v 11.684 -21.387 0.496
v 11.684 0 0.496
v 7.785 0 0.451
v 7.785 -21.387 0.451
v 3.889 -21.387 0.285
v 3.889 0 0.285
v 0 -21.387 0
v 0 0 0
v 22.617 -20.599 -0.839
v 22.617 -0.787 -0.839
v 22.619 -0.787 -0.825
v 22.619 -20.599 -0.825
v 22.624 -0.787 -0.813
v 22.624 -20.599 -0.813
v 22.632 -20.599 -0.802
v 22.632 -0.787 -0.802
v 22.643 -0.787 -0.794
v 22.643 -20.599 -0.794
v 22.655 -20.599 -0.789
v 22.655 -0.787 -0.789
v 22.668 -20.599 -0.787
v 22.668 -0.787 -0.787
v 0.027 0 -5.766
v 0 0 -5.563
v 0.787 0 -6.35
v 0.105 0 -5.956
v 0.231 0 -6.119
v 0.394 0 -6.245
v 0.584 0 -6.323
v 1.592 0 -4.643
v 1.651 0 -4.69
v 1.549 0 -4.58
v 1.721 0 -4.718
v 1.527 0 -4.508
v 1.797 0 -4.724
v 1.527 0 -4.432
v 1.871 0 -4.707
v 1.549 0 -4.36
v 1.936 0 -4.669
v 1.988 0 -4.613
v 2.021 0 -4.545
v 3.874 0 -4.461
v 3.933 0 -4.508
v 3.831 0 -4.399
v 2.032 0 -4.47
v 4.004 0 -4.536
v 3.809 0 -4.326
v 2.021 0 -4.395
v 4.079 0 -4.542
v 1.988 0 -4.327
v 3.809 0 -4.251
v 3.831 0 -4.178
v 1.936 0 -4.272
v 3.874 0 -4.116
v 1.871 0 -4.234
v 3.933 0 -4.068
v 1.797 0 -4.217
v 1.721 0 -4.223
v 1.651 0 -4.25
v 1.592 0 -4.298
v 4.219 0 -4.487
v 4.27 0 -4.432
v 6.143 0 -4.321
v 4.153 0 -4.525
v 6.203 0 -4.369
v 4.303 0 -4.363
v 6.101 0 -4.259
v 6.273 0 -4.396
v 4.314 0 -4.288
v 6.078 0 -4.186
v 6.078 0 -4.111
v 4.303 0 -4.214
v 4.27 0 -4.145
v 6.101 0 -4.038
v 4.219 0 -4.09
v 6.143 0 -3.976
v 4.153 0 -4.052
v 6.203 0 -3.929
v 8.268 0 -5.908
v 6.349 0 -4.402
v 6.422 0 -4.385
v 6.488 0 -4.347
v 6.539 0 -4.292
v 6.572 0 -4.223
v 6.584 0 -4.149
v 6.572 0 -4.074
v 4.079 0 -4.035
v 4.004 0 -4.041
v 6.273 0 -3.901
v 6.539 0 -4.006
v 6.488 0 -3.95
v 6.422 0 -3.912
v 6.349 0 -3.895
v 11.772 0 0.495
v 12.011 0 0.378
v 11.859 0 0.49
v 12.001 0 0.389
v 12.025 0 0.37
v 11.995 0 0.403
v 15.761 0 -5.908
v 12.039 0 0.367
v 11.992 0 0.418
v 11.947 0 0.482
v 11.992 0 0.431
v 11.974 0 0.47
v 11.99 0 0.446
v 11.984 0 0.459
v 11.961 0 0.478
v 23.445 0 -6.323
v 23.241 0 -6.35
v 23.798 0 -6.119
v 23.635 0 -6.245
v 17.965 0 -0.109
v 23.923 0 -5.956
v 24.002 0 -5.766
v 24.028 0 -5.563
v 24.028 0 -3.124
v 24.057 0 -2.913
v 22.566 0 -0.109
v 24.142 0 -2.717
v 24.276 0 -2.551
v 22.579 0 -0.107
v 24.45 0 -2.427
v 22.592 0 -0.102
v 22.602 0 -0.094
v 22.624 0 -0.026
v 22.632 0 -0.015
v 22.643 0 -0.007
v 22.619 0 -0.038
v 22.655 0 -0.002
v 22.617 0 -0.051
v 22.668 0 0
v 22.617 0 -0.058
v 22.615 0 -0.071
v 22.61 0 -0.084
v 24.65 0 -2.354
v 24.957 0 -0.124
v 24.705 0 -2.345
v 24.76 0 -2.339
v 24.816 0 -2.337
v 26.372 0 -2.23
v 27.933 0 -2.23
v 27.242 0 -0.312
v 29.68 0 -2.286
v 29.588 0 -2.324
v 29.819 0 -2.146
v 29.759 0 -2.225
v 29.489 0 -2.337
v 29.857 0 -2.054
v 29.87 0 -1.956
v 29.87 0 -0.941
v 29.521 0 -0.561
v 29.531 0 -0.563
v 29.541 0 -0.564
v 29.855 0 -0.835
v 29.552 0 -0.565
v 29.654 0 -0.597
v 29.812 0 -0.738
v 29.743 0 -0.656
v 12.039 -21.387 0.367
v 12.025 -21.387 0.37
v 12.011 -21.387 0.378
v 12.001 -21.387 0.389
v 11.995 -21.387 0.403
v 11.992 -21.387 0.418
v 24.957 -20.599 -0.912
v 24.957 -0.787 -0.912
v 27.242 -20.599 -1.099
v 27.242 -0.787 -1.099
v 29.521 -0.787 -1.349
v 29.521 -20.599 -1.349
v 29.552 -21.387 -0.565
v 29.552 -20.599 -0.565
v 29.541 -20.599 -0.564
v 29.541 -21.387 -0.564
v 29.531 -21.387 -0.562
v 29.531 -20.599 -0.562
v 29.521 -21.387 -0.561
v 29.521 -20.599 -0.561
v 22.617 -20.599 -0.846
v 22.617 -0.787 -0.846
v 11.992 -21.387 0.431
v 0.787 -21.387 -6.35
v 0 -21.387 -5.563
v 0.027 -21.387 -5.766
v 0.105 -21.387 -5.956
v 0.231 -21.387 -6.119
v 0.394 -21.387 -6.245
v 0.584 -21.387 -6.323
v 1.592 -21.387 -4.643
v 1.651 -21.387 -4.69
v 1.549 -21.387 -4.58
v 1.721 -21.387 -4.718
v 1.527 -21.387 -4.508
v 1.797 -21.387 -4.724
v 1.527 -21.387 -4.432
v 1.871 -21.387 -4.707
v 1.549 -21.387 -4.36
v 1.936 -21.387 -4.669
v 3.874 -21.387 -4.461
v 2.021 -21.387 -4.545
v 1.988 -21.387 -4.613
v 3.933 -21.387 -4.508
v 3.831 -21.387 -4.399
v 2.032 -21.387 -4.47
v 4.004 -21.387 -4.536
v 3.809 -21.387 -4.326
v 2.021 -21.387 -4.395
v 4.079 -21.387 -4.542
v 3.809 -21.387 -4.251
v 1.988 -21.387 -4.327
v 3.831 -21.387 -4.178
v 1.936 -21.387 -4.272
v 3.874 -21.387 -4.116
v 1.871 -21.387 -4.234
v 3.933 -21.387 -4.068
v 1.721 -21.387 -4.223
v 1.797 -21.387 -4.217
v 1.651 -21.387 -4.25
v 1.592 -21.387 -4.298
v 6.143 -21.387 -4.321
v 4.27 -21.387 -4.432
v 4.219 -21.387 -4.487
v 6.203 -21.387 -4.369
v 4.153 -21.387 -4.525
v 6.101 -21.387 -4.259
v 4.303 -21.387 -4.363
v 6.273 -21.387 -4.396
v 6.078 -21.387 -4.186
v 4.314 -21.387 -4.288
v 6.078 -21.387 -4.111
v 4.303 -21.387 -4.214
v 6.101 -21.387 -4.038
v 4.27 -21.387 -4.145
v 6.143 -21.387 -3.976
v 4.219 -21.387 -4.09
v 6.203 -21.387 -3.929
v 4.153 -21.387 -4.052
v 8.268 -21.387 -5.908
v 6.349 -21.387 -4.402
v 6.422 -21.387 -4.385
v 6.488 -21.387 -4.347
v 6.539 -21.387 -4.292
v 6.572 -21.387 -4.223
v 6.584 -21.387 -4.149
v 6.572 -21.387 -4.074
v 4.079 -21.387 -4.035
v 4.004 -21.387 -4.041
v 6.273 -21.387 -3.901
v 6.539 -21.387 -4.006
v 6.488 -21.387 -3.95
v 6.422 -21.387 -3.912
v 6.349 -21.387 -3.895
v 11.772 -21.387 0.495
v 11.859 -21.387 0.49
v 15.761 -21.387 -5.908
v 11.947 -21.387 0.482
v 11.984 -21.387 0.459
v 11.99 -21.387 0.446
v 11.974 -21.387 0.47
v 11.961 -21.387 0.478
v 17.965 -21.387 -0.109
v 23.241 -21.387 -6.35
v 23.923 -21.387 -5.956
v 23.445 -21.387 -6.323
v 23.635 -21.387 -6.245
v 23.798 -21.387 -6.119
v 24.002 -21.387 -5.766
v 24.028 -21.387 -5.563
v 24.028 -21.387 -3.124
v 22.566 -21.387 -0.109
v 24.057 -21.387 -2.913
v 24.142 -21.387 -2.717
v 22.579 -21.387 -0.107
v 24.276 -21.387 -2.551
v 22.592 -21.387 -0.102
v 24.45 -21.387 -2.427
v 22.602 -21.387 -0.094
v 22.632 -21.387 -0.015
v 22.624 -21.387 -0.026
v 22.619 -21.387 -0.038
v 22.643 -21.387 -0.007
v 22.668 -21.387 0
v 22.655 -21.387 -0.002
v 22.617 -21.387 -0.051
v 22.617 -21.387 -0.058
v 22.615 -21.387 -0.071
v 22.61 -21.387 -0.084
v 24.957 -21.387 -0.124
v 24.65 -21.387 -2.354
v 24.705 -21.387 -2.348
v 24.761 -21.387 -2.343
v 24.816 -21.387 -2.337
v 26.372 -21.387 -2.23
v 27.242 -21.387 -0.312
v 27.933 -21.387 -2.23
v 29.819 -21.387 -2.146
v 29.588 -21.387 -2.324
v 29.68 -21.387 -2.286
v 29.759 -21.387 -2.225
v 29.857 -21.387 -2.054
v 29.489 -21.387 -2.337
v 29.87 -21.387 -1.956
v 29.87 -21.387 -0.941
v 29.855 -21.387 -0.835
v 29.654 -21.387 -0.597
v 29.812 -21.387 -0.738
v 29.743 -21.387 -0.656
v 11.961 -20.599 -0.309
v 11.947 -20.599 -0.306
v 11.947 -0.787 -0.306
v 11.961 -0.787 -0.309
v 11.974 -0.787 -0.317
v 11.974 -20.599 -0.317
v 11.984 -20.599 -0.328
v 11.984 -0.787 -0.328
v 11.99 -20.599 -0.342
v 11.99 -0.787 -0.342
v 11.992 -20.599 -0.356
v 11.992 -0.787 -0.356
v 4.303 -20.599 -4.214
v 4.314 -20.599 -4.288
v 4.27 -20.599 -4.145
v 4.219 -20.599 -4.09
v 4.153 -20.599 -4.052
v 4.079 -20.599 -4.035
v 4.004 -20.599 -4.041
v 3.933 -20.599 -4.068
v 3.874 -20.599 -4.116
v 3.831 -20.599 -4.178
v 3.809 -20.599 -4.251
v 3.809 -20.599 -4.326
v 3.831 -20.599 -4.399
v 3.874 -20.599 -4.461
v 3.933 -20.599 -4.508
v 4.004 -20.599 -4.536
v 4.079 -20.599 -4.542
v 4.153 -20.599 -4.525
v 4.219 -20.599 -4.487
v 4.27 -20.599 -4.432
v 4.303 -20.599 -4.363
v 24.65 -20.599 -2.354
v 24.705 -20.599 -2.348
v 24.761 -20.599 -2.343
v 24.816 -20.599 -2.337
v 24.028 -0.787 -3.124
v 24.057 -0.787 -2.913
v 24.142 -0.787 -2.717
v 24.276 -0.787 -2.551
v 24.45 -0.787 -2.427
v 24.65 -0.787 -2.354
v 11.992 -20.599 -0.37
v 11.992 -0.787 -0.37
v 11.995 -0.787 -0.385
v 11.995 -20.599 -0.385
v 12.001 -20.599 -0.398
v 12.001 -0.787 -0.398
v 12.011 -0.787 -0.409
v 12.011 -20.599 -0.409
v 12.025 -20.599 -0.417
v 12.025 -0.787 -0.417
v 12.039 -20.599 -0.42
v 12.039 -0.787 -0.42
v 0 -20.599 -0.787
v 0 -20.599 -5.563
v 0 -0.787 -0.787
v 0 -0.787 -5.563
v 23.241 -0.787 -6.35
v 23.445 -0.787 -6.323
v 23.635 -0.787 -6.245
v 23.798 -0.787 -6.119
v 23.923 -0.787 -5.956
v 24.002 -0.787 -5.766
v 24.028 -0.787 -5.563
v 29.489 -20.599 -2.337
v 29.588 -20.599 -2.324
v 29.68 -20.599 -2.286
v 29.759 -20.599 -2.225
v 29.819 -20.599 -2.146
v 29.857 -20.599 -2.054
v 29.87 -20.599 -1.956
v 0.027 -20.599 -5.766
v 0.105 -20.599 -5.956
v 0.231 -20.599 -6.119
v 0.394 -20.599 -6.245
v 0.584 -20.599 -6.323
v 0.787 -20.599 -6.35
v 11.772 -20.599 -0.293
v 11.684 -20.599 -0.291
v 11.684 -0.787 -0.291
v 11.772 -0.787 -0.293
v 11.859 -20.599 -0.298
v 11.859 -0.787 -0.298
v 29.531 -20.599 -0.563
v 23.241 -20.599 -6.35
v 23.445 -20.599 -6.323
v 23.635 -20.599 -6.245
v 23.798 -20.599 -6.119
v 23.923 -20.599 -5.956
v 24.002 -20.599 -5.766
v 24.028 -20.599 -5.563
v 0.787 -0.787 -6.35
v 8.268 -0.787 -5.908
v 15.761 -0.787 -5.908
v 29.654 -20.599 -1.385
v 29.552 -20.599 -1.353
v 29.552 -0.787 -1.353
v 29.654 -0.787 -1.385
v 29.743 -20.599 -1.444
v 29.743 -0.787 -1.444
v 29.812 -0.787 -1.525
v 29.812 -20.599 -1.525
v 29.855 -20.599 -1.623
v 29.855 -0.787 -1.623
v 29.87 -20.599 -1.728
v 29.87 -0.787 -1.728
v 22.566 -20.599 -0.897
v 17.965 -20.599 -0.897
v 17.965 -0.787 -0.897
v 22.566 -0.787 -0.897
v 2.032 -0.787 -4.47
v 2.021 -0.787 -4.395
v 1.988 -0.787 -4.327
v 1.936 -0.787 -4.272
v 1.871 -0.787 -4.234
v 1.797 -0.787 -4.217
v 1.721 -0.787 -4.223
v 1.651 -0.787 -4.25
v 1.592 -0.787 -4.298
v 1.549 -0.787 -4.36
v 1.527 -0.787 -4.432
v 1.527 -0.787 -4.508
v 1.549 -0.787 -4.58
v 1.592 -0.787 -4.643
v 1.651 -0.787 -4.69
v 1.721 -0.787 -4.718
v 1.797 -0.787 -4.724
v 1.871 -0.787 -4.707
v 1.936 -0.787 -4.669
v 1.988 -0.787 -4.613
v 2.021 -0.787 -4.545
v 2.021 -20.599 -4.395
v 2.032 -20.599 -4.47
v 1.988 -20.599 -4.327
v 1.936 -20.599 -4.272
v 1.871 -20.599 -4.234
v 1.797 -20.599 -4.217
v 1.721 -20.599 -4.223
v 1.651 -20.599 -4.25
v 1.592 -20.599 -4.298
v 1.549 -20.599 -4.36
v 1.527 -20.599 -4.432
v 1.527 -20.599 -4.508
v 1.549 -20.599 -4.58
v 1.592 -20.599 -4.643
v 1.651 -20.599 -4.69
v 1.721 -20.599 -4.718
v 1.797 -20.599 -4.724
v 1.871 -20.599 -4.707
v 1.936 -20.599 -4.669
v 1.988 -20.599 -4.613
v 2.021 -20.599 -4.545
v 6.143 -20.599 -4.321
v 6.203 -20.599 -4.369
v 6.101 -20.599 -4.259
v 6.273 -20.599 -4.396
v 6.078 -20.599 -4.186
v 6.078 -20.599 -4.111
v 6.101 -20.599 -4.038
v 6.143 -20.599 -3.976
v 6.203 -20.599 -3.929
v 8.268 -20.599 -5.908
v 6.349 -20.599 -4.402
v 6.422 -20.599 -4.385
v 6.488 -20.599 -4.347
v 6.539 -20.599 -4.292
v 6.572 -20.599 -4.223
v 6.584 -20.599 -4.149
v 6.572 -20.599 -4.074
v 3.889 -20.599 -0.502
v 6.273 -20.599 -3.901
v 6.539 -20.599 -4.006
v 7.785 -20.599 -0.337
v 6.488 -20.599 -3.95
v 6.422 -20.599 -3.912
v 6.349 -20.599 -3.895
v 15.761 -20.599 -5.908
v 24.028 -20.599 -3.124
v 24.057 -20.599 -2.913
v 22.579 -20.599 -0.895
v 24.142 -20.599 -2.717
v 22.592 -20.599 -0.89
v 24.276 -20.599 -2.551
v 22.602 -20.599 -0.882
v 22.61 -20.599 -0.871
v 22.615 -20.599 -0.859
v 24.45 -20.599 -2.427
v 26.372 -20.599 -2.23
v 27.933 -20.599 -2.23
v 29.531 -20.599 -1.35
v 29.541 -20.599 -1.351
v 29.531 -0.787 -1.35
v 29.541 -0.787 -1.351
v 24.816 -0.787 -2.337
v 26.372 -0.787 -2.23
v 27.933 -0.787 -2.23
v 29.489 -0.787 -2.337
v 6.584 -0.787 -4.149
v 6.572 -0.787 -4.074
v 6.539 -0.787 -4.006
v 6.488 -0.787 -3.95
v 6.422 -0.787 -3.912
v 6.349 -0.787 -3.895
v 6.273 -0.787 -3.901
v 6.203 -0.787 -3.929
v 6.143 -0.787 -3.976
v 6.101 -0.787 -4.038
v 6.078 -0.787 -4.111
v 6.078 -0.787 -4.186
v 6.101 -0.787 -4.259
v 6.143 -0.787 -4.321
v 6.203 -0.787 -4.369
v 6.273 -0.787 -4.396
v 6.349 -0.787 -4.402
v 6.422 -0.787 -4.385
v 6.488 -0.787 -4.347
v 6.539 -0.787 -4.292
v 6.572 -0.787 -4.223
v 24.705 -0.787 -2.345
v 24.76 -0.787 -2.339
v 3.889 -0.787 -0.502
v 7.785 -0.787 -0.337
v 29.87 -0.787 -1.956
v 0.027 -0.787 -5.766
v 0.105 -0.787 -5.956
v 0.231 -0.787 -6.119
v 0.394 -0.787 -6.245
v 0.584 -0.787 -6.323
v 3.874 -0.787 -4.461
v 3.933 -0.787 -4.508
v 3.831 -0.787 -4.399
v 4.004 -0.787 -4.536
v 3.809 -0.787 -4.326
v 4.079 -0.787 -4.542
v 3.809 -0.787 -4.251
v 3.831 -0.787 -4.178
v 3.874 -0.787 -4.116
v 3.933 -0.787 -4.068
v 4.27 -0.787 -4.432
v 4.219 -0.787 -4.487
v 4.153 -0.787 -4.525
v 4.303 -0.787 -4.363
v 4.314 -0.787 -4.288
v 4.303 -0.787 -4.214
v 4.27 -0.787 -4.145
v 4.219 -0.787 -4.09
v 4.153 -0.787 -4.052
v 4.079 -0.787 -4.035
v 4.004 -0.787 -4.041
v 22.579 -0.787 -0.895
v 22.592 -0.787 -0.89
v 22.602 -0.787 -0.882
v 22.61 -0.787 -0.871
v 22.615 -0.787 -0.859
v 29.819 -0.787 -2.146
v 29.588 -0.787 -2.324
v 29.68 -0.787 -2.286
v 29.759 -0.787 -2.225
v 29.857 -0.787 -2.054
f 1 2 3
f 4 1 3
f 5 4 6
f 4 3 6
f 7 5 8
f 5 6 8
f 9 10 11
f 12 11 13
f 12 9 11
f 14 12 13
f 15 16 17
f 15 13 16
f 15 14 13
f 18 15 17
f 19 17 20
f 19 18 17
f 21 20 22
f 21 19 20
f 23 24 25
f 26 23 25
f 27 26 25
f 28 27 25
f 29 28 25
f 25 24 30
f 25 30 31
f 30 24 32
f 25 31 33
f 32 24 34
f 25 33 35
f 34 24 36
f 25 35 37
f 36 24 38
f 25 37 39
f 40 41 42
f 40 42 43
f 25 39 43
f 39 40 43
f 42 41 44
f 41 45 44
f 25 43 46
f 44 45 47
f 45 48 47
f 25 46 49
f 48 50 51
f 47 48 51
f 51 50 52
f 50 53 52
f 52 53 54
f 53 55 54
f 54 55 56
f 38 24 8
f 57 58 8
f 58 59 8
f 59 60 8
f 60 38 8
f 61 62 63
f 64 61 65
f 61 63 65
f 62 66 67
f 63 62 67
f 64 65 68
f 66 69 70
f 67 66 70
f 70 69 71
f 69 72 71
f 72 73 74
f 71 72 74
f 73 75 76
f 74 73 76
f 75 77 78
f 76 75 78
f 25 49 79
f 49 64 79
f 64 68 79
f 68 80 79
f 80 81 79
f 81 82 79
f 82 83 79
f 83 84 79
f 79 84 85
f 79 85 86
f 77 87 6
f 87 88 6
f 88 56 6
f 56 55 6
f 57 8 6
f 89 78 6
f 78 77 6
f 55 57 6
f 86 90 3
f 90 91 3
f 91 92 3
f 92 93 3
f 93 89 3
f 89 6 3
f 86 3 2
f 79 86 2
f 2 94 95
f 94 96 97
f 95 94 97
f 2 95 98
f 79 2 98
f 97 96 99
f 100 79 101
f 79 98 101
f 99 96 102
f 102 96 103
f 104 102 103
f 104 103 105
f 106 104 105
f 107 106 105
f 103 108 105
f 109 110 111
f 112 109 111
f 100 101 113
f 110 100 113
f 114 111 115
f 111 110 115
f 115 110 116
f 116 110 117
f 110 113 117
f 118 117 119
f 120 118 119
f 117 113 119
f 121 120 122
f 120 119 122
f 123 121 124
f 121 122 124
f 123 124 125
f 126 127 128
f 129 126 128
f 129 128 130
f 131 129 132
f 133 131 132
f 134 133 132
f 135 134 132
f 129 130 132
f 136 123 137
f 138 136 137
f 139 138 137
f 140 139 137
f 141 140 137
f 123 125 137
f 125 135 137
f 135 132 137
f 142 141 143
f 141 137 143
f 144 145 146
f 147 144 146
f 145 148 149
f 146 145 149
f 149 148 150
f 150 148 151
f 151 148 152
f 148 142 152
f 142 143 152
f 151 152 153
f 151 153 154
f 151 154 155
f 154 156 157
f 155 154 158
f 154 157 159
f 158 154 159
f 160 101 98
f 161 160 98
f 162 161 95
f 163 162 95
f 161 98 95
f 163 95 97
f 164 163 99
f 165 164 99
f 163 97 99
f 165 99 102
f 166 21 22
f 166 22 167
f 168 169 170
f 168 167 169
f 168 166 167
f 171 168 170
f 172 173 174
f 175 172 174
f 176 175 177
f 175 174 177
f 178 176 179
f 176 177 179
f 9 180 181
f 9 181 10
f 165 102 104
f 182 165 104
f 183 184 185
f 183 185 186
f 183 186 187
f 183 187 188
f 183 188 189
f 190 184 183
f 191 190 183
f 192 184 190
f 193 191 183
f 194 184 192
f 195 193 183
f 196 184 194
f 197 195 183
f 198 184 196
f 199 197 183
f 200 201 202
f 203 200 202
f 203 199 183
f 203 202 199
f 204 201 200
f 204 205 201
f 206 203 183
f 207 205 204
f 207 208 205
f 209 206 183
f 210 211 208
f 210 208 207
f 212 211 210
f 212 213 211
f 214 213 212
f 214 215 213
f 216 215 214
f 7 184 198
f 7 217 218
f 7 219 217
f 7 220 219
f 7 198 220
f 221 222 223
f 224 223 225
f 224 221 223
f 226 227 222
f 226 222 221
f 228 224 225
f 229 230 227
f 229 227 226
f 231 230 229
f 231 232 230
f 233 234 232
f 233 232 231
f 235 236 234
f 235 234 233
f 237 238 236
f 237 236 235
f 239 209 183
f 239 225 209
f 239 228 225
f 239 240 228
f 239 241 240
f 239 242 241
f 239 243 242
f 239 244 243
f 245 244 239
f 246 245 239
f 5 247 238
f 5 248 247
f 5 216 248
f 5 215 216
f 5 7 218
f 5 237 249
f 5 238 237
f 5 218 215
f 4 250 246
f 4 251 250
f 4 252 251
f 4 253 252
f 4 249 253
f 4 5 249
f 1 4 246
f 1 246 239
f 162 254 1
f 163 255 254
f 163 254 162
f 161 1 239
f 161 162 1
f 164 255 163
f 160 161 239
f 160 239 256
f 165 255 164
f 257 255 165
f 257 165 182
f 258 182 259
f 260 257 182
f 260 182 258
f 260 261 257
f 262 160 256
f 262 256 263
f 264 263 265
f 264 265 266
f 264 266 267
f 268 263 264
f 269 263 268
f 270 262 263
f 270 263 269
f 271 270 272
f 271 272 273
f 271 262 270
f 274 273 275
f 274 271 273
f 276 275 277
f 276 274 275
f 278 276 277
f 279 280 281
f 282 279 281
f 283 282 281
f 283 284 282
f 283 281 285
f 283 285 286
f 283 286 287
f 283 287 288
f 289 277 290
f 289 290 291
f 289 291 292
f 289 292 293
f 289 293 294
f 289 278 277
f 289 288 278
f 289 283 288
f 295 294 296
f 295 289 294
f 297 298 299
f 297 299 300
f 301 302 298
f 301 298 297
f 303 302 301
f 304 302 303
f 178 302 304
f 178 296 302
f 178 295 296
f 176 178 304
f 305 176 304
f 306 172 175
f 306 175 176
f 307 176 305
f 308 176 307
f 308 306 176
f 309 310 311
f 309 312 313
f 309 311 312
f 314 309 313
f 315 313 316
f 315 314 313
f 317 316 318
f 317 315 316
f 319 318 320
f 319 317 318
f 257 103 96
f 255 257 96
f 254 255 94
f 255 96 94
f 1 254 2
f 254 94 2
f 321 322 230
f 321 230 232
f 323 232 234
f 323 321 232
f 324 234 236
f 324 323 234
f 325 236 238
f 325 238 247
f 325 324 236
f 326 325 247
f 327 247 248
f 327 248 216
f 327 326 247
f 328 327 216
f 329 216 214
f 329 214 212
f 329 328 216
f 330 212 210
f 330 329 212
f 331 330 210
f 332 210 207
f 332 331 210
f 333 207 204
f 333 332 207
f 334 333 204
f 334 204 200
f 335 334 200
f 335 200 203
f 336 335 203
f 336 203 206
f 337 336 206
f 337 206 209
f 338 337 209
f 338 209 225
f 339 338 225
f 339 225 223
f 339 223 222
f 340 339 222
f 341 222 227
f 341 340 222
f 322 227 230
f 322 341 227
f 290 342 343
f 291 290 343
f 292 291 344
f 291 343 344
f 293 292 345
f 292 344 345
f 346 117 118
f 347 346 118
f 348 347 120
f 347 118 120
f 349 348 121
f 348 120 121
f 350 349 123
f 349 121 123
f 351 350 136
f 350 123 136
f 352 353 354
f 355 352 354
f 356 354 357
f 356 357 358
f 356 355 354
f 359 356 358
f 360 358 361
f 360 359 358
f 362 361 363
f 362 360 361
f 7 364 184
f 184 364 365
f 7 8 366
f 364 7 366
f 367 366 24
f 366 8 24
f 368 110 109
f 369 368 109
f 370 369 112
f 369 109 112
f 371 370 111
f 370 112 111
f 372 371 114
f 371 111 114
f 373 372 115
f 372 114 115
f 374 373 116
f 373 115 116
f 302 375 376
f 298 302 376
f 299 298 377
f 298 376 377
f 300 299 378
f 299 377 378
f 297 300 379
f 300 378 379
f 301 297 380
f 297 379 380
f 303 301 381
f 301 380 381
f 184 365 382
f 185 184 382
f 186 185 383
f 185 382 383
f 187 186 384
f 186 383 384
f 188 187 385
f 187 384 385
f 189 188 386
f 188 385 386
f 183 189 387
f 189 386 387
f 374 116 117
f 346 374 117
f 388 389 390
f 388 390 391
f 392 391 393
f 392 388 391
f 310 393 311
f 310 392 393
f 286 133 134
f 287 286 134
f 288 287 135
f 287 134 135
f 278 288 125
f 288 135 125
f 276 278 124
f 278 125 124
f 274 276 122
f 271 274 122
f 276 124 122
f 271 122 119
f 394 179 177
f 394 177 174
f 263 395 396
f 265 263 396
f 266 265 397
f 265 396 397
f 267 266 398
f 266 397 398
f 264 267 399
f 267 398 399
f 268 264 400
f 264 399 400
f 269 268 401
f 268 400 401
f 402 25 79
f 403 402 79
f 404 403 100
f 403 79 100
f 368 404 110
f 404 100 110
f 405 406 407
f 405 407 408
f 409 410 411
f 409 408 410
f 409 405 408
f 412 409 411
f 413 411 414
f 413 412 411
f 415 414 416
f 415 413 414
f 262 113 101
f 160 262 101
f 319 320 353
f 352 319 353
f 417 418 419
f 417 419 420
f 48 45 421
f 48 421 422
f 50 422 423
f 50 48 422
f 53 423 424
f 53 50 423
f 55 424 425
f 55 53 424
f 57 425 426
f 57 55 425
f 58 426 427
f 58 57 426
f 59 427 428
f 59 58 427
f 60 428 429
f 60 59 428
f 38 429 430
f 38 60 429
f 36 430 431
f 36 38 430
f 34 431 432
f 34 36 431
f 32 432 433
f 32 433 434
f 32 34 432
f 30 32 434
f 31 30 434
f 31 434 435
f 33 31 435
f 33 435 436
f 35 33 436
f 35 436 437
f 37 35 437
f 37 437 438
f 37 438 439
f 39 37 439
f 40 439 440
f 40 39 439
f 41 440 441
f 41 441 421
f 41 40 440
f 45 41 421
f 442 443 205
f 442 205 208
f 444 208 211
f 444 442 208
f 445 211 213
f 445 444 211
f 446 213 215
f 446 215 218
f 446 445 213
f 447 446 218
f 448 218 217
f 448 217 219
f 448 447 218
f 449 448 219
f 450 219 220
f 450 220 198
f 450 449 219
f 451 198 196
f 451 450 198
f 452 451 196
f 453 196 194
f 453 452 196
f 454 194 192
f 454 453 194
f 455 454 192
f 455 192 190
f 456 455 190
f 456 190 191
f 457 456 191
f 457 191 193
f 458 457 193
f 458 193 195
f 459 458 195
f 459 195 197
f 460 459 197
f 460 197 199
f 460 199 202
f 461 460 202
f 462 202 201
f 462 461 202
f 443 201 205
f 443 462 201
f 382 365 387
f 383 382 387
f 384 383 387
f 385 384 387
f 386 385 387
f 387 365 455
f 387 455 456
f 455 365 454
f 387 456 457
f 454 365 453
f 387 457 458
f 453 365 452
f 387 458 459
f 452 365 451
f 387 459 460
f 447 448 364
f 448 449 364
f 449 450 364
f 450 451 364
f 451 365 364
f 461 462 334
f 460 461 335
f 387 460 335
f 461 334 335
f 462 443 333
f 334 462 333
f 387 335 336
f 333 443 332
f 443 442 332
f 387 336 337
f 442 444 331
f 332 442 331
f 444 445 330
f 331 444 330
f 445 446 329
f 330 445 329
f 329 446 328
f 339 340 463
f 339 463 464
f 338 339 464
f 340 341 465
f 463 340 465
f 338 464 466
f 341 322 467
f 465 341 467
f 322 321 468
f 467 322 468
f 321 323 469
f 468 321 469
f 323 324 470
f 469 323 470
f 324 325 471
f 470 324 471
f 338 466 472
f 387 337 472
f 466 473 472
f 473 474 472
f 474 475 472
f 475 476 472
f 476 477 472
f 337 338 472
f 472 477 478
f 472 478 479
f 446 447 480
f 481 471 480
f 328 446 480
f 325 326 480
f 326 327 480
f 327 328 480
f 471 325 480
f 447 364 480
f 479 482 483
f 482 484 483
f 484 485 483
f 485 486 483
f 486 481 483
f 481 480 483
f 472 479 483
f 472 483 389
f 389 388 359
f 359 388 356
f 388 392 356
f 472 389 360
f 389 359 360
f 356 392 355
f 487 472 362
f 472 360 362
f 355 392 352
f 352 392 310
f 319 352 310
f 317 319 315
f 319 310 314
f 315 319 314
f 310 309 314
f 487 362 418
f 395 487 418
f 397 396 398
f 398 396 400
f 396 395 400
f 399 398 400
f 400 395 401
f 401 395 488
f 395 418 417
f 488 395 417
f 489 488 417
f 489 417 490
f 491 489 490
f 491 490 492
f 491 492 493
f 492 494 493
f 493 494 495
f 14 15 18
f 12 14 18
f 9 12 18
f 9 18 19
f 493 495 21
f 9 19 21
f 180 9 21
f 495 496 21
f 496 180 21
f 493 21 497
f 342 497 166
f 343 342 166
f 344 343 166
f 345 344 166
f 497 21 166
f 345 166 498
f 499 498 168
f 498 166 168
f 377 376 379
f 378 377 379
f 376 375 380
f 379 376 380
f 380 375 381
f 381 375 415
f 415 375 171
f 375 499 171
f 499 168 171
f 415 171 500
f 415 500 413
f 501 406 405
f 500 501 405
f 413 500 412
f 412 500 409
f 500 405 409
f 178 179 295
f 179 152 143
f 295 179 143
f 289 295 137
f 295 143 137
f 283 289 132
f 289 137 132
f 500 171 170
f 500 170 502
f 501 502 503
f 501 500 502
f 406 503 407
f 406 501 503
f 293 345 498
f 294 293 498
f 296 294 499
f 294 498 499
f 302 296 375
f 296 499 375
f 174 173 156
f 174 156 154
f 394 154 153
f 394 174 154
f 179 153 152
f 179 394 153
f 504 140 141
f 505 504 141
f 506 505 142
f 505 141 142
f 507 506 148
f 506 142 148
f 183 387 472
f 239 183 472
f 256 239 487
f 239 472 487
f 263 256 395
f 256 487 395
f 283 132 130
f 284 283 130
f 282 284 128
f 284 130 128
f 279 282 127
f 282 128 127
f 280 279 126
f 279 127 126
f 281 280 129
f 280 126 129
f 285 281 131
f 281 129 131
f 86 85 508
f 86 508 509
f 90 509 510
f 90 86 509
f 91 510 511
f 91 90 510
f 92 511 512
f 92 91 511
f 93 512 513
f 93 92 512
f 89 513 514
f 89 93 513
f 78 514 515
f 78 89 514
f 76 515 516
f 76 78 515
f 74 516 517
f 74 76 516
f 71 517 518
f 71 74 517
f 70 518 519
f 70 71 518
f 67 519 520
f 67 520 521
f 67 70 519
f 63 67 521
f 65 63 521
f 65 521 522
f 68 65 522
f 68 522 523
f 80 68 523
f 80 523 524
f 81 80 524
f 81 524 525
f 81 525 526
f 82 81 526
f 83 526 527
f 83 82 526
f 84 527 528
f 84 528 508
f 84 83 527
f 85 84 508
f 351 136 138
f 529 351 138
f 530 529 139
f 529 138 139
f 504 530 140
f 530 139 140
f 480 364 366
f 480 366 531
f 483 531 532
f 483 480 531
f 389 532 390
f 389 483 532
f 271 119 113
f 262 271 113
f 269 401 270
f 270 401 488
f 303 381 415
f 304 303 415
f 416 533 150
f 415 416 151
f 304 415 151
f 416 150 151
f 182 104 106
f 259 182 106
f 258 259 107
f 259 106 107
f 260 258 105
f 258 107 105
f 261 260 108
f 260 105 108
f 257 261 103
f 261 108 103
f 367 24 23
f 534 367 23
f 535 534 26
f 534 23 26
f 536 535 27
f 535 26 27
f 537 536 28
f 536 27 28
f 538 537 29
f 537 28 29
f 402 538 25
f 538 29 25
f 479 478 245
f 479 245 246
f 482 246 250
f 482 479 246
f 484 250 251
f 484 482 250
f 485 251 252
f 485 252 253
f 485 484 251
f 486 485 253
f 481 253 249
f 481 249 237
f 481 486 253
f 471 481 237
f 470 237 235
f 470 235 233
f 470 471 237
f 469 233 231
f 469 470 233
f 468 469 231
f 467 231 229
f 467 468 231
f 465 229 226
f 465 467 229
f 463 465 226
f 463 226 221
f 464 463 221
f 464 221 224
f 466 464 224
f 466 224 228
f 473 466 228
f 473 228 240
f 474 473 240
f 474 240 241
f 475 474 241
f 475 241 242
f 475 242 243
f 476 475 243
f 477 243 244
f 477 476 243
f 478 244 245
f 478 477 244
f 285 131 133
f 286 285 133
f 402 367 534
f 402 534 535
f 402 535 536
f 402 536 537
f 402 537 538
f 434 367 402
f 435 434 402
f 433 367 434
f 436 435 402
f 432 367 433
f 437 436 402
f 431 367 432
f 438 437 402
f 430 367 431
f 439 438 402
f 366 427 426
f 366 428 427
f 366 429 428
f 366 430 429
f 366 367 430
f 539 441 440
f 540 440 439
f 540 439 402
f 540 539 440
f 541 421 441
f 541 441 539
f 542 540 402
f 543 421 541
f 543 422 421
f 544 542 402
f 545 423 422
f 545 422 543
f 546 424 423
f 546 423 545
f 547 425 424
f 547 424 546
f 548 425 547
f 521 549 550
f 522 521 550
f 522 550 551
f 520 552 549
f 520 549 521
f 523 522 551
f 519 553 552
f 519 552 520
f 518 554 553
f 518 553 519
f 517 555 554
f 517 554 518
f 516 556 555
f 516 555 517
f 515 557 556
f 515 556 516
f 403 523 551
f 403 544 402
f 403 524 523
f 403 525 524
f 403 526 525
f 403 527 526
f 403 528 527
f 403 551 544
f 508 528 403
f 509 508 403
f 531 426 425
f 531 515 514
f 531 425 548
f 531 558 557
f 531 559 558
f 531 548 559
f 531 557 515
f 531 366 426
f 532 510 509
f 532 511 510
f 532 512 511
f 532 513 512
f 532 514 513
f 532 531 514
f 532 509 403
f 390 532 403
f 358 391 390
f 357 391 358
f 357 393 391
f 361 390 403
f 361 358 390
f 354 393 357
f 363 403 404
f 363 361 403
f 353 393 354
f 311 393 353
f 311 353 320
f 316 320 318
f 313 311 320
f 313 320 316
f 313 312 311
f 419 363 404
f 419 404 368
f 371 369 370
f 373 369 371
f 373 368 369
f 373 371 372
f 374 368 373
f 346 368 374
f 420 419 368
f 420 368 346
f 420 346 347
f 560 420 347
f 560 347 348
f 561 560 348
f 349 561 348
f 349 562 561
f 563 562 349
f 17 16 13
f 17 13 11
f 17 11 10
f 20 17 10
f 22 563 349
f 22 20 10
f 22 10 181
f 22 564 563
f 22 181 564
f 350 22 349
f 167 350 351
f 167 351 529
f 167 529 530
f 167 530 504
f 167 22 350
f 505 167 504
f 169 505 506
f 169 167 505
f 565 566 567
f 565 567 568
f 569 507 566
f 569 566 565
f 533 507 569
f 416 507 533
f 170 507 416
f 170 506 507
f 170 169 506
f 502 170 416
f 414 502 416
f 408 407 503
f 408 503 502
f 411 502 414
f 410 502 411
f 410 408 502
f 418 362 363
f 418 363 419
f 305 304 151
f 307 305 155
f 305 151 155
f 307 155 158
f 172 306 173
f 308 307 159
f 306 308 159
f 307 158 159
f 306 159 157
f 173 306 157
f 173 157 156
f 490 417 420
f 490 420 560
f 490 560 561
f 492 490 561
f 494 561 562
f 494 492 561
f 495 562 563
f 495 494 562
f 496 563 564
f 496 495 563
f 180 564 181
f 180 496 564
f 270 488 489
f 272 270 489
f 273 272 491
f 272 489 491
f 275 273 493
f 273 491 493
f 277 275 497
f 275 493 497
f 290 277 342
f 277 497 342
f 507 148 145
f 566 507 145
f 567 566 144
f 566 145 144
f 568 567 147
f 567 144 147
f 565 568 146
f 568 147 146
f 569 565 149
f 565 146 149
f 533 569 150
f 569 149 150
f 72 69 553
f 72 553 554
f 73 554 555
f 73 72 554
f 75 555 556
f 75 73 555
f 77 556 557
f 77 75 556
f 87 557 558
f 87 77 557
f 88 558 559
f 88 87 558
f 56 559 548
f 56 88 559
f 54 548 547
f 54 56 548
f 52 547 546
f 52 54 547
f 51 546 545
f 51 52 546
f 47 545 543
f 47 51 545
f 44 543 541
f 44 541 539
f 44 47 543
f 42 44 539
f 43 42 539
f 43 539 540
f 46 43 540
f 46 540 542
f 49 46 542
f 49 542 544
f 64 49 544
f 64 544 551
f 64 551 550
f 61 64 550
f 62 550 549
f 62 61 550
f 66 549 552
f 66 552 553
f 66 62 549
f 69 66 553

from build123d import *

# Parameters (mm, degrees)
F0_R     = 0.254
F1_DEPTH = 0.7874
F3_R     = 0.254
F4_DEPTH = 0.7874
F6_DEPTH = 20.828


with BuildPart() as f1:
    # F0 (on Front) → F1 (new body)
    with BuildSketch(Plane.XZ):
        with BuildLine():
            ThreePointArc((11.6844989808, 0.4963730507), (5.8365327764, 0.3827565605), (0, 0))
            Line((0, 0), (0, -5.5626))
            ThreePointArc((0, -5.5626), (0.2306241205, -6.1193758795), (0.7874, -6.35))
            ThreePointArc((0.7874, -6.35), (12.0142, -5.8528021894), (23.241, -6.35))
            ThreePointArc((23.241, -6.35), (23.7977758795, -6.1193758795), (24.0284, -5.5626))
            Line((24.0284, -5.5626), (24.0284, -3.1242))
            ThreePointArc((24.0284, -3.1242), (24.2032416576, -2.6294565946), (24.6501196779, -2.3544280917))
            ThreePointArc((24.6501196779, -2.3544280917), (24.7324922592, -2.3412194253), (24.8158, -2.3368))
            ThreePointArc((24.8158, -2.3368), (27.1526, -2.2171018645), (29.4894, -2.3368))
            ThreePointArc((29.4894, -2.3368), (29.7588076836, -2.2252076836), (29.8704, -1.9558))
            Line((29.8704, -1.9558), (29.8704, -0.9410763709))
            ThreePointArc((29.8704, -0.9410763709), (29.7800115236, -0.6946906116), (29.551733636, -0.5652100145))
            ThreePointArc((29.551733636, -0.5652100145), (29.5361211708, -0.563277779), (29.5205083425, -0.5613484801))
            ThreePointArc((29.5205083425, -0.5613484801), (26.1001935921, -0.2102344907), (22.6683376095, 0))
            ThreePointArc((22.6683376095, 0), (22.6321939395, -0.0149711983), (22.6172227412, -0.0511148683))
            Line((22.6172227412, -0.0511148683), (22.6172227412, -0.0581227141))
            ThreePointArc((22.6172227412, -0.0581227141), (22.602251543, -0.0942663841), (22.566107873, -0.1092375824))
            Line((22.566107873, -0.1092375824), (17.9650057107, -0.1092375824))
            Line((17.9650057107, -0.1092375824), (12.0393844661, 0.3669160007))
            ThreePointArc((12.0393844661, 0.3669160007), (12.0059153191, 0.3832006761), (11.9923637391, 0.4178666411))
            Line((11.9923637391, 0.4178666411), (11.9923637391, 0.4310297886))
            ThreePointArc((11.9923637391, 0.4310297886), (11.9792742883, 0.4651882045), (11.9467098063, 0.481852106))
            ThreePointArc((11.9467098063, 0.481852106), (11.8157921856, 0.4925036183), (11.6844989808, 0.4963730507))
        make_face()
        with Locations((1.778, -4.4702755668)):
            Circle(F0_R, mode=Mode.SUBTRACT)
        with Locations((4.0603091472, -4.2884453677)):
            Circle(F0_R, mode=Mode.SUBTRACT)
        with Locations((6.3296015834, -4.1486253579)):
            Circle(F0_R, mode=Mode.SUBTRACT)
    extrude(amount=F1_DEPTH)



with BuildPart() as f4:
    # F3 (on offset) → F4 (new body)
    with BuildSketch(Plane.XZ.offset(20.5994)):
        with BuildLine():
            ThreePointArc((11.6844989808, 0.4963730507), (5.8365327764, 0.3827565605), (0, 0))
            Line((0, 0), (0, -5.5626))
            ThreePointArc((0, -5.5626), (0.2306241205, -6.1193758795), (0.7874, -6.35))
            ThreePointArc((0.7874, -6.35), (12.0142, -5.8528021894), (23.241, -6.35))
            ThreePointArc((23.241, -6.35), (23.7977758795, -6.1193758795), (24.0284, -5.5626))
            Line((24.0284, -5.5626), (24.0284, -3.1242))
            ThreePointArc((24.0284, -3.1242), (24.2032416576, -2.6294565946), (24.6501196779, -2.3544280917))
            ThreePointArc((24.6501196779, -2.3544280917), (24.7324922592, -2.3412194253), (24.8158, -2.3368))
            ThreePointArc((24.8158, -2.3368), (27.1526, -2.2171018645), (29.4894, -2.3368))
            ThreePointArc((29.4894, -2.3368), (29.7588076836, -2.2252076836), (29.8704, -1.9558))
            Line((29.8704, -1.9558), (29.8704, -0.9410763709))
            ThreePointArc((29.8704, -0.9410763709), (29.7800115236, -0.6946906116), (29.551733636, -0.5652100145))
            ThreePointArc((29.551733636, -0.5652100145), (29.5361211708, -0.563277779), (29.5205083425, -0.5613484801))
            ThreePointArc((29.5205083425, -0.5613484801), (26.1001935921, -0.2102344907), (22.6683376095, 0))
            ThreePointArc((22.6683376095, 0), (22.6321939395, -0.0149711983), (22.6172227412, -0.0511148683))
            Line((22.6172227412, -0.0511148683), (22.6172227412, -0.0581227141))
            ThreePointArc((22.6172227412, -0.0581227141), (22.602251543, -0.0942663841), (22.566107873, -0.1092375824))
            Line((22.566107873, -0.1092375824), (17.9650057107, -0.1092375824))
            Line((17.9650057107, -0.1092375824), (12.0393844661, 0.3669160007))
            ThreePointArc((12.0393844661, 0.3669160007), (12.0059153191, 0.3832006761), (11.9923637391, 0.4178666411))
            Line((11.9923637391, 0.4178666411), (11.9923637391, 0.4310297886))
            ThreePointArc((11.9923637391, 0.4310297886), (11.9792742883, 0.4651882045), (11.9467098063, 0.481852106))
            ThreePointArc((11.9467098063, 0.481852106), (11.8157921856, 0.4925036183), (11.6844989808, 0.4963730507))
        make_face()
        with Locations((1.778, -4.4702755668)):
            Circle(F3_R, mode=Mode.SUBTRACT)
        with Locations((4.0603091472, -4.2884453677)):
            Circle(F3_R, mode=Mode.SUBTRACT)
        with Locations((6.3296015834, -4.1486253579)):
            Circle(F3_R, mode=Mode.SUBTRACT)
        with BuildLine():
            ThreePointArc((24.8158, -2.3368), (24.7324922592, -2.3412194253), (24.6501196779, -2.3544280917))
            ThreePointArc((24.6501196779, -2.3544280917), (24.7329437855, -2.345463165), (24.8158, -2.3368))
        make_face()
        with BuildLine():
            ThreePointArc((29.5205083425, -0.5613484801), (29.5361211708, -0.563277779), (29.551733636, -0.5652100145))
            ThreePointArc((29.551733636, -0.5652100145), (29.5361608672, -0.5629567849), (29.5205083425, -0.5613484801))
        make_face()
    extrude(amount=F4_DEPTH)


with BuildPart() as f1_1:
    add(f1.part)

    add(f4.part)  # F6 merges F4
    # F5 (on face) → F6 (join)
    with BuildSketch(Plane.XZ.offset(21.3868)):
        with BuildLine():
            ThreePointArc((29.551733636, -1.3526100145), (29.7800115236, -1.4820906116), (29.8704, -1.7284763709))
            Line((29.8704, -1.7284763709), (29.8704, -0.9410763709))
            ThreePointArc((29.8704, -0.9410763709), (29.7800115236, -0.6946906116), (29.551733636, -0.5652100145))
            ThreePointArc((29.551733636, -0.5652100145), (29.5361211708, -0.563277779), (29.5205083425, -0.5613484801))
            ThreePointArc((29.5205083425, -0.5613484801), (26.1001935921, -0.2102344907), (22.6683376095, 0))
            ThreePointArc((22.6683376095, 0), (22.6321939395, -0.0149711983), (22.6172227412, -0.0511148683))
            Line((22.6172227412, -0.0511148683), (22.6172227412, -0.0581227141))
            ThreePointArc((22.6172227412, -0.0581227141), (22.602251543, -0.0942663841), (22.566107873, -0.1092375824))
            Line((22.566107873, -0.1092375824), (17.9650057107, -0.1092375824))
            Line((17.9650057107, -0.1092375824), (12.0393844661, 0.3669160007))
            ThreePointArc((12.0393844661, 0.3669160007), (12.0059153191, 0.3832006761), (11.9923637391, 0.4178666411))
            Line((11.9923637391, 0.4178666411), (11.9923637391, 0.4310297886))
            ThreePointArc((11.9923637391, 0.4310297886), (11.9792742883, 0.4651882045), (11.9467098063, 0.481852106))
            ThreePointArc((11.9467098063, 0.481852106), (11.8157921856, 0.4925036183), (11.6844989808, 0.4963730507))
            ThreePointArc((11.6844989808, 0.4963730507), (5.8365327764, 0.3827565605), (0, 0))
            Line((0, 0), (0, -0.7874))
            ThreePointArc((0, -0.7874), (5.8365327764, -0.4046434395), (11.6844989808, -0.2910269493))
            ThreePointArc((11.6844989808, -0.2910269493), (11.8157921856, -0.2948963817), (11.9467098063, -0.305547894))
            ThreePointArc((11.9467098063, -0.305547894), (11.9792742883, -0.3222117955), (11.9923637391, -0.3563702114))
            Line((11.9923637391, -0.3563702114), (11.9923637391, -0.3695333589))
            ThreePointArc((11.9923637391, -0.3695333589), (12.0059153191, -0.4041993239), (12.0393844661, -0.4204839993))
            Line((12.0393844661, -0.4204839993), (17.9650057107, -0.8966375824))
            Line((17.9650057107, -0.8966375824), (22.566107873, -0.8966375824))
            ThreePointArc((22.566107873, -0.8966375824), (22.602251543, -0.8816663841), (22.6172227412, -0.8455227141))
            Line((22.6172227412, -0.8455227141), (22.6172227412, -0.8385148683))
            ThreePointArc((22.6172227412, -0.8385148683), (22.6321939395, -0.8023711983), (22.6683376095, -0.7874))
            ThreePointArc((22.6683376095, -0.7874), (26.1001935921, -0.9976344907), (29.5205083425, -1.3487484801))
            ThreePointArc((29.5205083425, -1.3487484801), (29.5361608672, -1.3503567849), (29.551733636, -1.3526100145))
        make_face()
    extrude(amount=-F6_DEPTH)


solid = f1_1.part
